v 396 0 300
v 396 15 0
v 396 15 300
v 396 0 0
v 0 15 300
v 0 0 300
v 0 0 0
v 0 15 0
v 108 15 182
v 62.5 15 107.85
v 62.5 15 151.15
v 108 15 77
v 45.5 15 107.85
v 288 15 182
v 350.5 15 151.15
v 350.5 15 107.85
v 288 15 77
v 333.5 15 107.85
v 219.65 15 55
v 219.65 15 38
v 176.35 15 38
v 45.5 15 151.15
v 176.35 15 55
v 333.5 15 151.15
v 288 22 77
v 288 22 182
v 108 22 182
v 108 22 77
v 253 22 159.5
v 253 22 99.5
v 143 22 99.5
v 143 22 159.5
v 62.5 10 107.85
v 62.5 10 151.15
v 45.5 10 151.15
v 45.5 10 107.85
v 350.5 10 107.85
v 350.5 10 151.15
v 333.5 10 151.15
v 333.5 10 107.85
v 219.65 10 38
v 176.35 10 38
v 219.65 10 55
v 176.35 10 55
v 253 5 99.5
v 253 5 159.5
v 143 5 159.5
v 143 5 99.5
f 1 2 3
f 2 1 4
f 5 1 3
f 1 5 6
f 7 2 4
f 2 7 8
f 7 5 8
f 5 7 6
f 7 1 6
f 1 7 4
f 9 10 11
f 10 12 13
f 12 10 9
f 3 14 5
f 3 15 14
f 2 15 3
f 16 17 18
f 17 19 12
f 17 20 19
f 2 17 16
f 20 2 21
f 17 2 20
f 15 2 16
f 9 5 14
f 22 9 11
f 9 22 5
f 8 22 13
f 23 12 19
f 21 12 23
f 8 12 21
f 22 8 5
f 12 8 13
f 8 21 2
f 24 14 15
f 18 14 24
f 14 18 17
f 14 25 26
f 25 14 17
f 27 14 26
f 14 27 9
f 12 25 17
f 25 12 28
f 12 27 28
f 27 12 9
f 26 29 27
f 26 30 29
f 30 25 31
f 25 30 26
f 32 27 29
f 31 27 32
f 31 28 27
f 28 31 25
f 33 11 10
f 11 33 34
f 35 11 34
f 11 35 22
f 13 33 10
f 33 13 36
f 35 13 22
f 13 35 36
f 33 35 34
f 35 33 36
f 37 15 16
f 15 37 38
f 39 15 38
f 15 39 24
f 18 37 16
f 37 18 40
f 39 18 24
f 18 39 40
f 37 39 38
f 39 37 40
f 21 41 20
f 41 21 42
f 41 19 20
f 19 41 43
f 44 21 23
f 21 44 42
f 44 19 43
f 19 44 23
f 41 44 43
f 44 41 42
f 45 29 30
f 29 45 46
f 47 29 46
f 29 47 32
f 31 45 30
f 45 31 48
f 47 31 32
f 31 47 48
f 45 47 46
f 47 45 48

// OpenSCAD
wallWidth = 396;
wallHeight = 300;
wallDepth = 5;
mainFrameDepth = 10;
sideboardHeight = 50;

// Speakrs
speakerWidth = 17;
speakerHeight = 43.3;
speakerDepth = 10;
echo(str("speakerWidth = ", speakerWidth));
echo(str("speakerHeight = ", speakerHeight));
echo(str("speakerDepth = ", speakerDepth));

module wall(){
    color("white") cube([wallWidth,wallDepth, wallHeight]);
}

module mainFrame(){
    translate([0, wallDepth, 0]){
        color("white") cube([wallWidth,mainFrameDepth, wallHeight]);
    }
}

stageWidth = 180;
stageHeight = 105;
stageDepth = 7;
stageUp = sideboardHeight + 5 + speakerWidth + 5;   
echo(str("stageWidth = ", stageWidth));
echo(str("stageHeight = ", stageHeight));
echo(str("bottom to stage = ", stageUp));

stageLeft = (wallWidth - stageWidth) / 2;
module stage(){ 
    // stageUp = (wallHeight - stageHeight) / 2;
    stageOut = wallDepth + mainFrameDepth;  
    translate([stageLeft,stageOut,stageUp]){
        color("grey") cube([stageWidth, stageDepth, stageHeight]);
    }
}

mainHoleWidth = 110;
mainHoleHeight = 60;
mainHoleDepth = mainFrameDepth + stageDepth;
echo(str("mainHoleWidth = ", mainHoleWidth));
echo(str("mainHoleHeight = ", mainHoleHeight));
module mainHole(){
    mainHoleLeft = (wallWidth - mainHoleWidth) / 2;
    mainHoleUp = (stageHeight - mainHoleHeight) / 2 + stageUp;
    echo(str("bottom to main hole = ", mainHoleUp));
    mainHoleOut = wallDepth;
    translate([mainHoleLeft, mainHoleOut, mainHoleUp]){
        color("white") cube([mainHoleWidth, mainHoleDepth, mainHoleHeight]);
    }
}



module baseSpeaker(){
    color("black") cube([17,10, 43.3]);
}

sideSpeakerUp = (stageHeight - speakerHeight) / 2 + stageUp;
sideSpeakerOut = wallDepth;
echo(str("bottom to side speaker = ", sideSpeakerUp));

module rightSpeaker(){
    rightSpeakerLeft = (stageLeft - speakerWidth) / 2;
    echo(str("rightSpeakerLeft = ", rightSpeakerLeft));
    translate([rightSpeakerLeft,mainFrameDepth,sideSpeakerUp]) baseSpeaker();
}

module leftSpeaker(){
    leftSpeakerLeft = (stageLeft - speakerWidth) / 2 + stageWidth + stageLeft;
    // echo(str("leftSpeakerLeft = ", leftSpeakerLeft));
    translate([leftSpeakerLeft,mainFrameDepth,sideSpeakerUp]) baseSpeaker();
}

module centerSpeaker(){
    centerTop = sideboardHeight + 5;
    echo(str("bottom to center speaker = ", centerTop));
    centerToStage = stageUp - centerTop - speakerWidth;
    echo(str("center speaker to stage = ", centerToStage));
    centerLeft = (wallWidth - speakerHeight) / 2;
    translate([centerLeft, mainFrameDepth, centerTop]) {
        rotate([0, 90, 0]) baseSpeaker();
    }
}

module outObjects(){
    union(){
        wall();
        mainFrame();
        stage();
    }
}

module inObjects(){
    union(){
        rightSpeaker();
        leftSpeaker();
        centerSpeaker();
        mainHole();
    }
}

module all(){
    difference(){
        outObjects();
        inObjects();
    }
}

all();
// inObjects();
// wall();
// mainFrame();
// rightSpeaker();
// leftSpeaker();
// stage();
